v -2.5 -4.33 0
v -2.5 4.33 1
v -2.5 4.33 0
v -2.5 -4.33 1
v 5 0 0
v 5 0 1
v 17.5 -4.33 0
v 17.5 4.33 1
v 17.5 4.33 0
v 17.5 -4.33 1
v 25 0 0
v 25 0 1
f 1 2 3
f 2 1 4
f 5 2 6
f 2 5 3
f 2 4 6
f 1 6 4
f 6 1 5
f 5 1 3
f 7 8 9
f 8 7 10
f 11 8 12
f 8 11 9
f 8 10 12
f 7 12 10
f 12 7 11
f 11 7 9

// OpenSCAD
module workaround() {

}

$fn=3;
cylinder(r=5,h=1);
//$fn=64;
translate([20,0,0]) cylinder(r=5,h=1);
